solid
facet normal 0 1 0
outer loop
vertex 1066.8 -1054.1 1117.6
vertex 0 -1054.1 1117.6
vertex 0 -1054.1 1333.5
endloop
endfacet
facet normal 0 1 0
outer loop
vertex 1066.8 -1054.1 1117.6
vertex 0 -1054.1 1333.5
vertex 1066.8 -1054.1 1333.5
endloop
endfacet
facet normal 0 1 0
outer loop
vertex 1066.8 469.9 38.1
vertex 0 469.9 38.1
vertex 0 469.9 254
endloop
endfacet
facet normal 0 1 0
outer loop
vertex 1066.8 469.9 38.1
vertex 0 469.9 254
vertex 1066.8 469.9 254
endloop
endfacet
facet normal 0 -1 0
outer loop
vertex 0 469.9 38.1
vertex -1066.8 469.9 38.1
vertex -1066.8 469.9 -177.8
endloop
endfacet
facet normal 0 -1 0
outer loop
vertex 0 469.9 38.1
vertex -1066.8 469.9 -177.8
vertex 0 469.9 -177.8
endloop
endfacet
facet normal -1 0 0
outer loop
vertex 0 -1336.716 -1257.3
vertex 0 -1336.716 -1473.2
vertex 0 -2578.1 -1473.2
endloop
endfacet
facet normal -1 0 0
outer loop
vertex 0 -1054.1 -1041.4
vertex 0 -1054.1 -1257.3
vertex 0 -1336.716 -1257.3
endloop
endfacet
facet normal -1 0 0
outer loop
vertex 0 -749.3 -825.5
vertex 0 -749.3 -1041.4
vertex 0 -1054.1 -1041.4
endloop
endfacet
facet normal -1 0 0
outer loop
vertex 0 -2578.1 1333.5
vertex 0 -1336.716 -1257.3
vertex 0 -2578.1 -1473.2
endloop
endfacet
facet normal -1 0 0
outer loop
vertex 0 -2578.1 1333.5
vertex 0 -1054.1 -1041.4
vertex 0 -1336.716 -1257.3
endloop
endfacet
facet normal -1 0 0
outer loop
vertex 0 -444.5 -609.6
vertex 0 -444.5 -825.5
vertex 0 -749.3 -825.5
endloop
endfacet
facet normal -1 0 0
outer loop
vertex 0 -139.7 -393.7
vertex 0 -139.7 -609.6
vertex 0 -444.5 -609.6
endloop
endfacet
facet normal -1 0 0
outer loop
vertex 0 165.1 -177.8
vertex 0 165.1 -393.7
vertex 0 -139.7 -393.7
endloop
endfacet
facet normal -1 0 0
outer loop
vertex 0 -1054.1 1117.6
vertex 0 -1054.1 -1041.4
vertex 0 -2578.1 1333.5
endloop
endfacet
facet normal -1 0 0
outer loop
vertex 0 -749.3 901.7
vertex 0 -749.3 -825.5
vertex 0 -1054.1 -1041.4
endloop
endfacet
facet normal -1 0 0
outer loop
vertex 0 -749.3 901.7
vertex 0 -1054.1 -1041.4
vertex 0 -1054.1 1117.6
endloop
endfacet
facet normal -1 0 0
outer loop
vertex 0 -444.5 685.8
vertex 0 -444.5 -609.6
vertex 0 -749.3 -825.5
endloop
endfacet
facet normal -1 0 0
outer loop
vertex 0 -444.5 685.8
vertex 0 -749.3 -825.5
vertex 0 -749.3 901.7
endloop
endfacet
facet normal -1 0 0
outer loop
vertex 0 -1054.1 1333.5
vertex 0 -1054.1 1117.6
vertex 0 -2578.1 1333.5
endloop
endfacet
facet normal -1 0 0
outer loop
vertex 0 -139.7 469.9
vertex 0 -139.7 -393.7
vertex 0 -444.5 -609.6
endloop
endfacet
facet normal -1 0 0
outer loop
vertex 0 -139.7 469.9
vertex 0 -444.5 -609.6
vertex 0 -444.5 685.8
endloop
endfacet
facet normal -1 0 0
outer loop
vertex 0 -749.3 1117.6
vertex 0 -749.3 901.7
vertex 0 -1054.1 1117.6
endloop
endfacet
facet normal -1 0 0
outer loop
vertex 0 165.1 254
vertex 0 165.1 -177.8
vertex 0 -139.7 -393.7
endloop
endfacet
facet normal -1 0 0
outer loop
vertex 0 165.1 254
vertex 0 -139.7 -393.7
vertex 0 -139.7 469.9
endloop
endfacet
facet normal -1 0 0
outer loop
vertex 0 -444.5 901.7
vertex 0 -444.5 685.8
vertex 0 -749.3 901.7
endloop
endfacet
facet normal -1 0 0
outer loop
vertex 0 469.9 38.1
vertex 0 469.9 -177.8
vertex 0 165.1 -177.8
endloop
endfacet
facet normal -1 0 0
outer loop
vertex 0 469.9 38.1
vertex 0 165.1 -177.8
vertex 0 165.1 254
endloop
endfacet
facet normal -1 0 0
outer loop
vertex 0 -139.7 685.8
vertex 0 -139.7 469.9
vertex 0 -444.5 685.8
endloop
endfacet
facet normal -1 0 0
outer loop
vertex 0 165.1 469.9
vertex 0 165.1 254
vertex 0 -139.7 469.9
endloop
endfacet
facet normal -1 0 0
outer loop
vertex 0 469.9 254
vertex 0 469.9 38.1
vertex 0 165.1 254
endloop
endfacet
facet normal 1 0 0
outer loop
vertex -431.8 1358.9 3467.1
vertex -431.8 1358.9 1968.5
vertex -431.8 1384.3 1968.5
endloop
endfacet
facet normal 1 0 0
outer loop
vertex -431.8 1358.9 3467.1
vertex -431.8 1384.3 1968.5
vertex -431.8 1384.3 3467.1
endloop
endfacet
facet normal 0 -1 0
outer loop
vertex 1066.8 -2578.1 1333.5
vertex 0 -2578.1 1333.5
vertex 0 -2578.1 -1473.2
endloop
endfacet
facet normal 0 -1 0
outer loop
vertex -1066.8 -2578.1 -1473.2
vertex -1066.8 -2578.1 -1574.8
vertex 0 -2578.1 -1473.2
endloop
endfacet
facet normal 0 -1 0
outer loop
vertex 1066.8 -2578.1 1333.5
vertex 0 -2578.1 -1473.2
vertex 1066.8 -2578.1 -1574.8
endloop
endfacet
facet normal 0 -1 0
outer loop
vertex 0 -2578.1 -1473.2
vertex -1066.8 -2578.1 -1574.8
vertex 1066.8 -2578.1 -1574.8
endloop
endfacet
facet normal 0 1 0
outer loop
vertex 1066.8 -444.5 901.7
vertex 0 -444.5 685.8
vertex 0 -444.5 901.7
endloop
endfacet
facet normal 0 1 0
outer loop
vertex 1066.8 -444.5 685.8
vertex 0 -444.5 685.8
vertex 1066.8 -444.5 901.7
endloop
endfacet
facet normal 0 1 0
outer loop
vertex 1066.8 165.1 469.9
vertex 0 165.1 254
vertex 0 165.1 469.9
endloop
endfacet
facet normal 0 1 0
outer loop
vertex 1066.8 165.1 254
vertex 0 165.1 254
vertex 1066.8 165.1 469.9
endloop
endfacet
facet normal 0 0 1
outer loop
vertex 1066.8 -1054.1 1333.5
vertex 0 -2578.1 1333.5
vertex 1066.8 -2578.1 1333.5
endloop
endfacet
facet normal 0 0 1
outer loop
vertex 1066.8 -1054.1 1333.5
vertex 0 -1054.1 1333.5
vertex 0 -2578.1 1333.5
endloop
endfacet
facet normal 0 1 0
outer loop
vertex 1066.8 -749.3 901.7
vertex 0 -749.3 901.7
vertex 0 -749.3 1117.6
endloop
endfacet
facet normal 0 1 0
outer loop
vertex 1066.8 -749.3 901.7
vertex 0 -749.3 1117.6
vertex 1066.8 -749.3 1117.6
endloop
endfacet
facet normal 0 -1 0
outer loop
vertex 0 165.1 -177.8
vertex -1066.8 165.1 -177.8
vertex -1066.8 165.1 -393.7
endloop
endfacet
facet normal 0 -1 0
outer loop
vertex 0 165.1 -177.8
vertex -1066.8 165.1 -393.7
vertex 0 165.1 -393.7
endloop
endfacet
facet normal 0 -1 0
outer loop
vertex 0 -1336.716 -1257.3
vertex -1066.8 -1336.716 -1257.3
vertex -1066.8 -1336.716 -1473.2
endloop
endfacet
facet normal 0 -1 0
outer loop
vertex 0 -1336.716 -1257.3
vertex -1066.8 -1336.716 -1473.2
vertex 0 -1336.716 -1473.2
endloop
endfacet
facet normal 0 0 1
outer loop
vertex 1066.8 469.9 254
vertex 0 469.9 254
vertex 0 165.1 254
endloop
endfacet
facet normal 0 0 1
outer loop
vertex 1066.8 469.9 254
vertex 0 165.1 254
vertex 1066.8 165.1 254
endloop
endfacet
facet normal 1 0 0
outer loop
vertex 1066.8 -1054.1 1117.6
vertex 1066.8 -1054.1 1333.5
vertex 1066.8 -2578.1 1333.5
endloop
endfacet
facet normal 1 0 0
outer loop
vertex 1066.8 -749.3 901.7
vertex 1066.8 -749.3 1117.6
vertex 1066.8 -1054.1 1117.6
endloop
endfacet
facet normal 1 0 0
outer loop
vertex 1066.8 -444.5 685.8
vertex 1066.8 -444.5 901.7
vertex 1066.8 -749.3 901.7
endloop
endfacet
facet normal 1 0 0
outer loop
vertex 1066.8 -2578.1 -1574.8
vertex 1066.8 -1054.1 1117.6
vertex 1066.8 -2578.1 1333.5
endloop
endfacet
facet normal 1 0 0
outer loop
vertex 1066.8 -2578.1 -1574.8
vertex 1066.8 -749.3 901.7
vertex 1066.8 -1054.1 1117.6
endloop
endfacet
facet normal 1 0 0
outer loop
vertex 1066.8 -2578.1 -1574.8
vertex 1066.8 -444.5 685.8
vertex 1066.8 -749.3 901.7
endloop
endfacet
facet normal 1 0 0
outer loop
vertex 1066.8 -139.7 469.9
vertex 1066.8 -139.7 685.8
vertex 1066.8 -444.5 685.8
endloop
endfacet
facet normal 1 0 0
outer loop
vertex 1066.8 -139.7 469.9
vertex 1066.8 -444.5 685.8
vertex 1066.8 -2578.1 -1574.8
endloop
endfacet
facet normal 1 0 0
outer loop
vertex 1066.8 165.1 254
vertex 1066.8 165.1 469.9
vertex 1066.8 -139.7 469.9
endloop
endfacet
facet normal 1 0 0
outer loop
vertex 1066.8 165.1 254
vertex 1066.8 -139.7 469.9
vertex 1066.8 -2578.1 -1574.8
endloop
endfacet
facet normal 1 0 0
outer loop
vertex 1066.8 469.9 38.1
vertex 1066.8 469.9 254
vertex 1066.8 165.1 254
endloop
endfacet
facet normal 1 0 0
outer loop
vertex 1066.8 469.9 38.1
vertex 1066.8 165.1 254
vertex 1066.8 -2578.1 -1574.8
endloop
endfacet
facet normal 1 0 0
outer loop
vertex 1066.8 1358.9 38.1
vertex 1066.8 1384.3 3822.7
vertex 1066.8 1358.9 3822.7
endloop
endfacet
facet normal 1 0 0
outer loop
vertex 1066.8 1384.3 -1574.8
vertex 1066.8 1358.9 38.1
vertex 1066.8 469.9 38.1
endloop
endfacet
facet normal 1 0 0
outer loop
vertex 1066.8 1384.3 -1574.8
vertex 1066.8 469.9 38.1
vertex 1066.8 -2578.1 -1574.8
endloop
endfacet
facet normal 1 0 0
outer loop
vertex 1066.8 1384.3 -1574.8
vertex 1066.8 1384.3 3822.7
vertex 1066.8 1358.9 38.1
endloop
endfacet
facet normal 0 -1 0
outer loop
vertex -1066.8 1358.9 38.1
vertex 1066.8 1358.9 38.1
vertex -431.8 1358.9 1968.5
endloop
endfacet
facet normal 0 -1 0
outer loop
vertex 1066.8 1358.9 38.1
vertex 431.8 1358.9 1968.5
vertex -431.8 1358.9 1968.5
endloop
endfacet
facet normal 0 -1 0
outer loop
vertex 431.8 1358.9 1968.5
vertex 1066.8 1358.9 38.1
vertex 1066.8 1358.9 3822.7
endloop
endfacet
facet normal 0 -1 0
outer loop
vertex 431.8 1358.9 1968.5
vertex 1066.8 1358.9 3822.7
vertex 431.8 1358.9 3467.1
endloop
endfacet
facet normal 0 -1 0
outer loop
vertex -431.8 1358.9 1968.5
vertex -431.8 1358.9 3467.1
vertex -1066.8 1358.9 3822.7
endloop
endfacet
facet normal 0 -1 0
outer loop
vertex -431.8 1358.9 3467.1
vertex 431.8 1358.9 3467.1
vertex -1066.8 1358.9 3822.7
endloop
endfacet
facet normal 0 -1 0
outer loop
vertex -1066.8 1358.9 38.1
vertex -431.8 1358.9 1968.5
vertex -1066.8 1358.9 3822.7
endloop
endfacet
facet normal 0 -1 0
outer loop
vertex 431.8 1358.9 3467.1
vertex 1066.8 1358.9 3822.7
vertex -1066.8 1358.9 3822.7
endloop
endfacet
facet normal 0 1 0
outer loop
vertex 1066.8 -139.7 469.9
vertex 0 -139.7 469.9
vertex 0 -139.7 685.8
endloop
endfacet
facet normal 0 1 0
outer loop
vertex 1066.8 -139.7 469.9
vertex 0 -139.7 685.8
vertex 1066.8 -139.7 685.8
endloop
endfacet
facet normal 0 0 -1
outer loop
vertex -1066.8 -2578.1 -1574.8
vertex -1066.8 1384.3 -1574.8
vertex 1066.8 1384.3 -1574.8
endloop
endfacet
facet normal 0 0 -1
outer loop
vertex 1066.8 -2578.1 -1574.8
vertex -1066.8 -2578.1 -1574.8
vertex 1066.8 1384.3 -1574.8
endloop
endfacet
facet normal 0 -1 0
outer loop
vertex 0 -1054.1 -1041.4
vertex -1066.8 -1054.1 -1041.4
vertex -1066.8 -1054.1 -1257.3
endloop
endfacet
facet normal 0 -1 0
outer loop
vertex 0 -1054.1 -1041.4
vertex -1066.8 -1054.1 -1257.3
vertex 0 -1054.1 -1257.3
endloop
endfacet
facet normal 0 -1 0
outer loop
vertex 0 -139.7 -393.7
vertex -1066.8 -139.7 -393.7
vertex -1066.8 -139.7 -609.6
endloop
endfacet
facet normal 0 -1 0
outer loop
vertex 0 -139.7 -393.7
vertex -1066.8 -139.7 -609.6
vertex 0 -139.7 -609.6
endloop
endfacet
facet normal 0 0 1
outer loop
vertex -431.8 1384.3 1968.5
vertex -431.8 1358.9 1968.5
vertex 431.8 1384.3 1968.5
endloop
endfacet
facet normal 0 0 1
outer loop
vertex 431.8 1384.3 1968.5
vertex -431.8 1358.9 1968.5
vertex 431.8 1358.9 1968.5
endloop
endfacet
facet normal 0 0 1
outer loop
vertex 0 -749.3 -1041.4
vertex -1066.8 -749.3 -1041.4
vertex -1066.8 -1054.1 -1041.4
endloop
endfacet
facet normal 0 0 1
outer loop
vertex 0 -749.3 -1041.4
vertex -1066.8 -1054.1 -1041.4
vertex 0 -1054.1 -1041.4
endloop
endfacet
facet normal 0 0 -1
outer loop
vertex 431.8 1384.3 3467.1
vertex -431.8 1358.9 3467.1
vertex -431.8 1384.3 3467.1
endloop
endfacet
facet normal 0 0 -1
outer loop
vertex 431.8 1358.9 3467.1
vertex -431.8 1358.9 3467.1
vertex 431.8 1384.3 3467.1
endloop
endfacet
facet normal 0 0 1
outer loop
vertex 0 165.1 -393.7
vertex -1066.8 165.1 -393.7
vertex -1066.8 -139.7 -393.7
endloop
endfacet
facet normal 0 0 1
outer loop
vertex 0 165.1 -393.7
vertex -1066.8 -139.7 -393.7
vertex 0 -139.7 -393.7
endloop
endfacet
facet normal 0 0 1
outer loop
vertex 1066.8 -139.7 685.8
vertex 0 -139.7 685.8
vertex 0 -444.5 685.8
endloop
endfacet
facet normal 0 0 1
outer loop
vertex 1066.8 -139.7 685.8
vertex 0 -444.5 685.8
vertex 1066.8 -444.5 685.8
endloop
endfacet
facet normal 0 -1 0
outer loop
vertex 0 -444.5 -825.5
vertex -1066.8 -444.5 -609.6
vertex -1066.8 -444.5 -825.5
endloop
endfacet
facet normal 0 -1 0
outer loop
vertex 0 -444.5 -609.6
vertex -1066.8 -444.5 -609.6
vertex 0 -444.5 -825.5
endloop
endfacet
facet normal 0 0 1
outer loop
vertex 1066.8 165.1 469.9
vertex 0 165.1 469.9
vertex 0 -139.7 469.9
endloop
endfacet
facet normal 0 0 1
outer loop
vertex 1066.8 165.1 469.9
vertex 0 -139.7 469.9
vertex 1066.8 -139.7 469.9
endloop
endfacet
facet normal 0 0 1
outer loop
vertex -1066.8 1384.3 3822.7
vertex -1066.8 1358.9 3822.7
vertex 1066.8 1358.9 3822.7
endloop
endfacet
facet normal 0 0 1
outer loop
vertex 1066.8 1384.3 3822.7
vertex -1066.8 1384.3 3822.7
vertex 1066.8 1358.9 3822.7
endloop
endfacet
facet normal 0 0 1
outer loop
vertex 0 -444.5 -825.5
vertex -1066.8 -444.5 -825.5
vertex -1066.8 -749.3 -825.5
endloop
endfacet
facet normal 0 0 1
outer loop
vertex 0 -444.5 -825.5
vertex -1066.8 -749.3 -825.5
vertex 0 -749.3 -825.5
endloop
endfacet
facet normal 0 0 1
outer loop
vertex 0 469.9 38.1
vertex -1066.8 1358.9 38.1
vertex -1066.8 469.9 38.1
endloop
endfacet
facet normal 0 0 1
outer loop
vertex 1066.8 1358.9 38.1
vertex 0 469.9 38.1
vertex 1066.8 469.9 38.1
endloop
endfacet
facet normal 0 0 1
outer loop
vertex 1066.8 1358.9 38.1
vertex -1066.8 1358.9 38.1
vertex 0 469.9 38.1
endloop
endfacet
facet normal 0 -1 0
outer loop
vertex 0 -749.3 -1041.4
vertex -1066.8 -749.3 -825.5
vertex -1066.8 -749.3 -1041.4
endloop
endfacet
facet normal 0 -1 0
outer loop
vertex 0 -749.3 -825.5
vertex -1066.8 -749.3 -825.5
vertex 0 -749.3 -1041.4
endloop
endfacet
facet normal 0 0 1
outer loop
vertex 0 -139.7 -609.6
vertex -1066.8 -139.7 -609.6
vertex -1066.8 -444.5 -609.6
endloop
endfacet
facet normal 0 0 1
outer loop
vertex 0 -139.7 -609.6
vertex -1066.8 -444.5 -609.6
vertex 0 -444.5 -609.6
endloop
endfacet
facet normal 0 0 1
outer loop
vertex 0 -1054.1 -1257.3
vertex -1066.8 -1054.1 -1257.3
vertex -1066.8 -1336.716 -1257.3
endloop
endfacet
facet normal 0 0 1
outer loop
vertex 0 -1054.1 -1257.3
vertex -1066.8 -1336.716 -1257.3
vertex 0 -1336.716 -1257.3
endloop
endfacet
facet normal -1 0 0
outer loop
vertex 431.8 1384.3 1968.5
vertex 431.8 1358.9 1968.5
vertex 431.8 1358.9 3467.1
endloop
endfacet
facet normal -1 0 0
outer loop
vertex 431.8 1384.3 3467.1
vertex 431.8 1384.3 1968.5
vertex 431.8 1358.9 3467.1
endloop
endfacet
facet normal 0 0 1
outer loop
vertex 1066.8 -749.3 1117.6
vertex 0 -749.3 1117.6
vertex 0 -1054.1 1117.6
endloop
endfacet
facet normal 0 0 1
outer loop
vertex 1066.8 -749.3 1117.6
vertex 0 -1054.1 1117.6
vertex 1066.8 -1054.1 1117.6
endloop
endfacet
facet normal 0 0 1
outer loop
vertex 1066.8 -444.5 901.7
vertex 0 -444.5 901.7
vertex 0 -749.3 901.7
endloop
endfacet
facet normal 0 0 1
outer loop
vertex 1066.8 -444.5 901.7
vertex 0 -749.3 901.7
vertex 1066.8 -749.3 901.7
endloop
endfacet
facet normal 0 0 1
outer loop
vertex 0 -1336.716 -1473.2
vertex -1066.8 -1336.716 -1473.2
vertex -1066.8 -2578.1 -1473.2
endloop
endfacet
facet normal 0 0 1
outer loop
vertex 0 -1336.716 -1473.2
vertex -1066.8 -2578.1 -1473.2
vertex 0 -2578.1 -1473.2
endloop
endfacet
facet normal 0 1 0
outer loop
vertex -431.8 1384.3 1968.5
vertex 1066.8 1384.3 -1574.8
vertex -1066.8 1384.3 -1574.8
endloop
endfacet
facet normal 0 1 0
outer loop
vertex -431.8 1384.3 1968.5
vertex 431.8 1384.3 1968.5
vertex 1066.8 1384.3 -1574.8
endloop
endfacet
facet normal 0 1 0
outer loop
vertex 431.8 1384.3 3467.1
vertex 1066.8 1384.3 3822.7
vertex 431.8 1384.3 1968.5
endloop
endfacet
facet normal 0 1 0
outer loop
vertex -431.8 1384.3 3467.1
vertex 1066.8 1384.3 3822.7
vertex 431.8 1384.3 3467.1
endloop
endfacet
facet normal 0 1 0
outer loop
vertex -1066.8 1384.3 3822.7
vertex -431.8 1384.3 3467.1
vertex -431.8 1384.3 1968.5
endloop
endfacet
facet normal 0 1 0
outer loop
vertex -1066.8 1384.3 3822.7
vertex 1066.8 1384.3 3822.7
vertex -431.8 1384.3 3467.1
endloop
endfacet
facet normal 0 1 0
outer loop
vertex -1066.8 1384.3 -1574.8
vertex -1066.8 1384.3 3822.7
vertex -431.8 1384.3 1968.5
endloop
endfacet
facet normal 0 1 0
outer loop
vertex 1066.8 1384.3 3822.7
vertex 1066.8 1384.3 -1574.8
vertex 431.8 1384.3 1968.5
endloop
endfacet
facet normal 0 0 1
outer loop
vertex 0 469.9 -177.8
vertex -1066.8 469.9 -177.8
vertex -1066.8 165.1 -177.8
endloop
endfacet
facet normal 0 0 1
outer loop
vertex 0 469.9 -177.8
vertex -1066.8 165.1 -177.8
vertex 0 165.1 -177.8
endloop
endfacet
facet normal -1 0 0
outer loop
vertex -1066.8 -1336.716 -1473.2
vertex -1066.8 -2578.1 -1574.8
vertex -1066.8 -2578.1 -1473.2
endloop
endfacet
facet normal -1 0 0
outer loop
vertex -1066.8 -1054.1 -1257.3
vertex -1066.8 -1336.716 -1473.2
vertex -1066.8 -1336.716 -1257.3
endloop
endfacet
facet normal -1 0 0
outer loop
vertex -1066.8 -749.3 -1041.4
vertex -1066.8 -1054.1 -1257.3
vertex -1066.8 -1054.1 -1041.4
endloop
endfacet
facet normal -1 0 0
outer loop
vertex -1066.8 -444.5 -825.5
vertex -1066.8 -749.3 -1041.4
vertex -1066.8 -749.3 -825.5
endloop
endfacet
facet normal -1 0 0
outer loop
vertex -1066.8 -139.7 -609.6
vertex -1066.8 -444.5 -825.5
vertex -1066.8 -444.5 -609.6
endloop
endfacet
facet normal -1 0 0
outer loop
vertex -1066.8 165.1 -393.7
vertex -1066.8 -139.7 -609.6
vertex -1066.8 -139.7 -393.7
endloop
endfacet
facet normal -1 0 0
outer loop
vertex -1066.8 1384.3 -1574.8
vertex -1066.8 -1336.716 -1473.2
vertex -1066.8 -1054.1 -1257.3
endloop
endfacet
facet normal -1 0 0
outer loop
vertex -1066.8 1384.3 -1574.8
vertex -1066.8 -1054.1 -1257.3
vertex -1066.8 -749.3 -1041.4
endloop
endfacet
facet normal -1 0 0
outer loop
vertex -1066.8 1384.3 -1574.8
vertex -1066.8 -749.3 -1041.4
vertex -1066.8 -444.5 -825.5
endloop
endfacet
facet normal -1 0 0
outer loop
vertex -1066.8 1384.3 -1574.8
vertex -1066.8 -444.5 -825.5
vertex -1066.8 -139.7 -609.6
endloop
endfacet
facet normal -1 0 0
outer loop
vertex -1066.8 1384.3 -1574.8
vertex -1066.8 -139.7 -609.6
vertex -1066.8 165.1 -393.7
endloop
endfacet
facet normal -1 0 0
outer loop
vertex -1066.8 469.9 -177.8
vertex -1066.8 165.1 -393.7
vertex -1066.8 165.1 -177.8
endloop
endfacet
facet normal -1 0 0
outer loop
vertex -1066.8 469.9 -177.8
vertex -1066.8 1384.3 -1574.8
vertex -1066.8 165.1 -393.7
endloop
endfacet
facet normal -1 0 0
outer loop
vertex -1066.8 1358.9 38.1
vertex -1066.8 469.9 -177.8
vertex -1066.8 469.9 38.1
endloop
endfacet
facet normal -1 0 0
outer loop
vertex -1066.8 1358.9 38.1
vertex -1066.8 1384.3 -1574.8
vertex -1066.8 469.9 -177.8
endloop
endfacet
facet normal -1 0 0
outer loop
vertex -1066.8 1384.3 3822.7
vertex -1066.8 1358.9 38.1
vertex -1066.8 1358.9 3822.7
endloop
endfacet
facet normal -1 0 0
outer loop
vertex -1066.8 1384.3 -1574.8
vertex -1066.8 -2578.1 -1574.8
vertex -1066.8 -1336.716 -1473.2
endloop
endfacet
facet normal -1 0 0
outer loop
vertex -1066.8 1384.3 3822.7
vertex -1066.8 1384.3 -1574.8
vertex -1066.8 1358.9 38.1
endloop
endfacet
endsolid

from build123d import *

# Parameters (mm, degrees)
F0_W      = 2133.6
F0_H      = 2717.8
F1_DEPTH  = 38.1
F3_DEPTH  = 25.4
F4_W      = 863.6
F4_H      = 1498.6
F5_DEPTH  = 50.8
F7_DEPTH  = 1574.8
F6_W      = 1066.8
F6_H      = 304.8
F8_DEPTH  = 1295.4
F9_DEPTH  = 1079.5
F10_DEPTH = 863.6
F11_DEPTH = 647.7
F12_DEPTH = 431.8
F13_DEPTH = 215.9
F14_W     = 1066.8
F14_H     = 304.8
F15_DEPTH = 215.9
F16_DEPTH = 431.8
F17_DEPTH = 647.7
F18_DEPTH = 863.6
F19_DEPTH = 1079.5
F20_DEPTH = 1295.4
F21_DEPTH = 1219.2
F22_W     = 1066.8
F22_H     = 1241.3837057114
F23_DEPTH = 215.9


with BuildPart() as f1:
    # F0 (on Top) → F1 (new body)
    with BuildSketch(Plane.XY):
        Rectangle(F0_W, F0_H)
    extrude(amount=F1_DEPTH)

    # F2 (on face) → F3 (join)
    with BuildSketch(Plane(origin=(0, 1358.9, 0), x_dir=(-1, 0, 0), z_dir=(0, 1, 0))):
        Polygon((1066.8, 3822.7), (-1066.8, 3822.7), (-1066.8, 38.1), (-1066.8, 0), (1066.8, 0), (1066.8, 38.1), align=None)
    extrude(amount=F3_DEPTH)

    # F4 (on face) → F5 (cut)
    with BuildSketch(Plane.XZ.offset(-1358.9)):
        with Locations((0, 2717.8)):
            Rectangle(F4_W, F4_H)
    extrude(amount=-F5_DEPTH, mode=Mode.SUBTRACT)

    # F7 (add): a face of the model
    f7_faces = [f1.faces().sort_by_distance(p)[0] for p in [
        (0, 12.7, 0),
    ]]
    extrude(f7_faces, amount=F7_DEPTH)

    # F6 (on face) → F8 (cut)
    with BuildSketch(Plane.XY.offset(38.1)):
        with Locations((-533.4, -1206.5)):
            Rectangle(F6_W, F6_H)
    extrude(amount=-F8_DEPTH, mode=Mode.SUBTRACT)

    # F6 (on face) → F9 (cut)
    with BuildSketch(Plane.XY.offset(38.1)):
        with Locations((-533.4, -901.7)):
            Rectangle(F6_W, F6_H)
    extrude(amount=-F9_DEPTH, mode=Mode.SUBTRACT)

    # F6 (on face) → F10 (cut)
    with BuildSketch(Plane.XY.offset(38.1)):
        with Locations((-533.4, -596.9)):
            Rectangle(F6_W, F6_H)
    extrude(amount=-F10_DEPTH, mode=Mode.SUBTRACT)

    # F6 (on face) → F11 (cut)
    with BuildSketch(Plane.XY.offset(38.1)):
        with Locations((-533.4, -292.1)):
            Rectangle(F6_W, F6_H)
    extrude(amount=-F11_DEPTH, mode=Mode.SUBTRACT)

    # F6 (on face) → F12 (cut)
    with BuildSketch(Plane.XY.offset(38.1)):
        with Locations((-533.4, 12.7)):
            Rectangle(F6_W, F6_H)
    extrude(amount=-F12_DEPTH, mode=Mode.SUBTRACT)

    # F6 (on face) → F13 (cut)
    with BuildSketch(Plane.XY.offset(38.1)):
        with Locations((-533.4, 317.5)):
            Rectangle(F6_W, F6_H)
    extrude(amount=-F13_DEPTH, mode=Mode.SUBTRACT)

    # F14 (on face) → F15 (join)
    with BuildSketch(Plane.XY.offset(38.1)):
        with Locations((533.4, 317.5)):
            Rectangle(F14_W, F14_H)
    extrude(amount=F15_DEPTH)

    # F14 (on face) → F16 (join)
    with BuildSketch(Plane.XY.offset(38.1)):
        with Locations((533.4, 12.7)):
            Rectangle(F14_W, F14_H)
    extrude(amount=F16_DEPTH)

    # F14 (on face) → F17 (join)
    with BuildSketch(Plane.XY.offset(38.1)):
        with Locations((533.4, -292.1)):
            Rectangle(F14_W, F14_H)
    extrude(amount=F17_DEPTH)

    # F14 (on face) → F18 (join)
    with BuildSketch(Plane.XY.offset(38.1)):
        with Locations((533.4, -596.9)):
            Rectangle(F14_W, F14_H)
    extrude(amount=F18_DEPTH)

    # F14 (on face) → F19 (join)
    with BuildSketch(Plane.XY.offset(38.1)):
        with Locations((533.4, -901.7)):
            Rectangle(F14_W, F14_H)
    extrude(amount=F19_DEPTH)

    # F20 (add): a face of the model
    f20_faces = [f1.faces().sort_by_distance(p)[0] for p in [
        (533.4, -1206.5, 38.1),
    ]]
    extrude(f20_faces, amount=F20_DEPTH)

    # F21 (add): a face of the model
    f21_faces = [f1.faces().sort_by_distance(p)[0] for p in [
        (428.4, -1358.9, -248.15),
    ]]
    extrude(f21_faces, amount=F21_DEPTH)

    # F22 (on face) → F23 (cut)
    with BuildSketch(Plane.XY.offset(-1257.3)):
        with Locations((-533.4, -1957.4081471443)):
            Rectangle(F22_W, F22_H)
    extrude(amount=-F23_DEPTH, mode=Mode.SUBTRACT)


solid = f1.part
